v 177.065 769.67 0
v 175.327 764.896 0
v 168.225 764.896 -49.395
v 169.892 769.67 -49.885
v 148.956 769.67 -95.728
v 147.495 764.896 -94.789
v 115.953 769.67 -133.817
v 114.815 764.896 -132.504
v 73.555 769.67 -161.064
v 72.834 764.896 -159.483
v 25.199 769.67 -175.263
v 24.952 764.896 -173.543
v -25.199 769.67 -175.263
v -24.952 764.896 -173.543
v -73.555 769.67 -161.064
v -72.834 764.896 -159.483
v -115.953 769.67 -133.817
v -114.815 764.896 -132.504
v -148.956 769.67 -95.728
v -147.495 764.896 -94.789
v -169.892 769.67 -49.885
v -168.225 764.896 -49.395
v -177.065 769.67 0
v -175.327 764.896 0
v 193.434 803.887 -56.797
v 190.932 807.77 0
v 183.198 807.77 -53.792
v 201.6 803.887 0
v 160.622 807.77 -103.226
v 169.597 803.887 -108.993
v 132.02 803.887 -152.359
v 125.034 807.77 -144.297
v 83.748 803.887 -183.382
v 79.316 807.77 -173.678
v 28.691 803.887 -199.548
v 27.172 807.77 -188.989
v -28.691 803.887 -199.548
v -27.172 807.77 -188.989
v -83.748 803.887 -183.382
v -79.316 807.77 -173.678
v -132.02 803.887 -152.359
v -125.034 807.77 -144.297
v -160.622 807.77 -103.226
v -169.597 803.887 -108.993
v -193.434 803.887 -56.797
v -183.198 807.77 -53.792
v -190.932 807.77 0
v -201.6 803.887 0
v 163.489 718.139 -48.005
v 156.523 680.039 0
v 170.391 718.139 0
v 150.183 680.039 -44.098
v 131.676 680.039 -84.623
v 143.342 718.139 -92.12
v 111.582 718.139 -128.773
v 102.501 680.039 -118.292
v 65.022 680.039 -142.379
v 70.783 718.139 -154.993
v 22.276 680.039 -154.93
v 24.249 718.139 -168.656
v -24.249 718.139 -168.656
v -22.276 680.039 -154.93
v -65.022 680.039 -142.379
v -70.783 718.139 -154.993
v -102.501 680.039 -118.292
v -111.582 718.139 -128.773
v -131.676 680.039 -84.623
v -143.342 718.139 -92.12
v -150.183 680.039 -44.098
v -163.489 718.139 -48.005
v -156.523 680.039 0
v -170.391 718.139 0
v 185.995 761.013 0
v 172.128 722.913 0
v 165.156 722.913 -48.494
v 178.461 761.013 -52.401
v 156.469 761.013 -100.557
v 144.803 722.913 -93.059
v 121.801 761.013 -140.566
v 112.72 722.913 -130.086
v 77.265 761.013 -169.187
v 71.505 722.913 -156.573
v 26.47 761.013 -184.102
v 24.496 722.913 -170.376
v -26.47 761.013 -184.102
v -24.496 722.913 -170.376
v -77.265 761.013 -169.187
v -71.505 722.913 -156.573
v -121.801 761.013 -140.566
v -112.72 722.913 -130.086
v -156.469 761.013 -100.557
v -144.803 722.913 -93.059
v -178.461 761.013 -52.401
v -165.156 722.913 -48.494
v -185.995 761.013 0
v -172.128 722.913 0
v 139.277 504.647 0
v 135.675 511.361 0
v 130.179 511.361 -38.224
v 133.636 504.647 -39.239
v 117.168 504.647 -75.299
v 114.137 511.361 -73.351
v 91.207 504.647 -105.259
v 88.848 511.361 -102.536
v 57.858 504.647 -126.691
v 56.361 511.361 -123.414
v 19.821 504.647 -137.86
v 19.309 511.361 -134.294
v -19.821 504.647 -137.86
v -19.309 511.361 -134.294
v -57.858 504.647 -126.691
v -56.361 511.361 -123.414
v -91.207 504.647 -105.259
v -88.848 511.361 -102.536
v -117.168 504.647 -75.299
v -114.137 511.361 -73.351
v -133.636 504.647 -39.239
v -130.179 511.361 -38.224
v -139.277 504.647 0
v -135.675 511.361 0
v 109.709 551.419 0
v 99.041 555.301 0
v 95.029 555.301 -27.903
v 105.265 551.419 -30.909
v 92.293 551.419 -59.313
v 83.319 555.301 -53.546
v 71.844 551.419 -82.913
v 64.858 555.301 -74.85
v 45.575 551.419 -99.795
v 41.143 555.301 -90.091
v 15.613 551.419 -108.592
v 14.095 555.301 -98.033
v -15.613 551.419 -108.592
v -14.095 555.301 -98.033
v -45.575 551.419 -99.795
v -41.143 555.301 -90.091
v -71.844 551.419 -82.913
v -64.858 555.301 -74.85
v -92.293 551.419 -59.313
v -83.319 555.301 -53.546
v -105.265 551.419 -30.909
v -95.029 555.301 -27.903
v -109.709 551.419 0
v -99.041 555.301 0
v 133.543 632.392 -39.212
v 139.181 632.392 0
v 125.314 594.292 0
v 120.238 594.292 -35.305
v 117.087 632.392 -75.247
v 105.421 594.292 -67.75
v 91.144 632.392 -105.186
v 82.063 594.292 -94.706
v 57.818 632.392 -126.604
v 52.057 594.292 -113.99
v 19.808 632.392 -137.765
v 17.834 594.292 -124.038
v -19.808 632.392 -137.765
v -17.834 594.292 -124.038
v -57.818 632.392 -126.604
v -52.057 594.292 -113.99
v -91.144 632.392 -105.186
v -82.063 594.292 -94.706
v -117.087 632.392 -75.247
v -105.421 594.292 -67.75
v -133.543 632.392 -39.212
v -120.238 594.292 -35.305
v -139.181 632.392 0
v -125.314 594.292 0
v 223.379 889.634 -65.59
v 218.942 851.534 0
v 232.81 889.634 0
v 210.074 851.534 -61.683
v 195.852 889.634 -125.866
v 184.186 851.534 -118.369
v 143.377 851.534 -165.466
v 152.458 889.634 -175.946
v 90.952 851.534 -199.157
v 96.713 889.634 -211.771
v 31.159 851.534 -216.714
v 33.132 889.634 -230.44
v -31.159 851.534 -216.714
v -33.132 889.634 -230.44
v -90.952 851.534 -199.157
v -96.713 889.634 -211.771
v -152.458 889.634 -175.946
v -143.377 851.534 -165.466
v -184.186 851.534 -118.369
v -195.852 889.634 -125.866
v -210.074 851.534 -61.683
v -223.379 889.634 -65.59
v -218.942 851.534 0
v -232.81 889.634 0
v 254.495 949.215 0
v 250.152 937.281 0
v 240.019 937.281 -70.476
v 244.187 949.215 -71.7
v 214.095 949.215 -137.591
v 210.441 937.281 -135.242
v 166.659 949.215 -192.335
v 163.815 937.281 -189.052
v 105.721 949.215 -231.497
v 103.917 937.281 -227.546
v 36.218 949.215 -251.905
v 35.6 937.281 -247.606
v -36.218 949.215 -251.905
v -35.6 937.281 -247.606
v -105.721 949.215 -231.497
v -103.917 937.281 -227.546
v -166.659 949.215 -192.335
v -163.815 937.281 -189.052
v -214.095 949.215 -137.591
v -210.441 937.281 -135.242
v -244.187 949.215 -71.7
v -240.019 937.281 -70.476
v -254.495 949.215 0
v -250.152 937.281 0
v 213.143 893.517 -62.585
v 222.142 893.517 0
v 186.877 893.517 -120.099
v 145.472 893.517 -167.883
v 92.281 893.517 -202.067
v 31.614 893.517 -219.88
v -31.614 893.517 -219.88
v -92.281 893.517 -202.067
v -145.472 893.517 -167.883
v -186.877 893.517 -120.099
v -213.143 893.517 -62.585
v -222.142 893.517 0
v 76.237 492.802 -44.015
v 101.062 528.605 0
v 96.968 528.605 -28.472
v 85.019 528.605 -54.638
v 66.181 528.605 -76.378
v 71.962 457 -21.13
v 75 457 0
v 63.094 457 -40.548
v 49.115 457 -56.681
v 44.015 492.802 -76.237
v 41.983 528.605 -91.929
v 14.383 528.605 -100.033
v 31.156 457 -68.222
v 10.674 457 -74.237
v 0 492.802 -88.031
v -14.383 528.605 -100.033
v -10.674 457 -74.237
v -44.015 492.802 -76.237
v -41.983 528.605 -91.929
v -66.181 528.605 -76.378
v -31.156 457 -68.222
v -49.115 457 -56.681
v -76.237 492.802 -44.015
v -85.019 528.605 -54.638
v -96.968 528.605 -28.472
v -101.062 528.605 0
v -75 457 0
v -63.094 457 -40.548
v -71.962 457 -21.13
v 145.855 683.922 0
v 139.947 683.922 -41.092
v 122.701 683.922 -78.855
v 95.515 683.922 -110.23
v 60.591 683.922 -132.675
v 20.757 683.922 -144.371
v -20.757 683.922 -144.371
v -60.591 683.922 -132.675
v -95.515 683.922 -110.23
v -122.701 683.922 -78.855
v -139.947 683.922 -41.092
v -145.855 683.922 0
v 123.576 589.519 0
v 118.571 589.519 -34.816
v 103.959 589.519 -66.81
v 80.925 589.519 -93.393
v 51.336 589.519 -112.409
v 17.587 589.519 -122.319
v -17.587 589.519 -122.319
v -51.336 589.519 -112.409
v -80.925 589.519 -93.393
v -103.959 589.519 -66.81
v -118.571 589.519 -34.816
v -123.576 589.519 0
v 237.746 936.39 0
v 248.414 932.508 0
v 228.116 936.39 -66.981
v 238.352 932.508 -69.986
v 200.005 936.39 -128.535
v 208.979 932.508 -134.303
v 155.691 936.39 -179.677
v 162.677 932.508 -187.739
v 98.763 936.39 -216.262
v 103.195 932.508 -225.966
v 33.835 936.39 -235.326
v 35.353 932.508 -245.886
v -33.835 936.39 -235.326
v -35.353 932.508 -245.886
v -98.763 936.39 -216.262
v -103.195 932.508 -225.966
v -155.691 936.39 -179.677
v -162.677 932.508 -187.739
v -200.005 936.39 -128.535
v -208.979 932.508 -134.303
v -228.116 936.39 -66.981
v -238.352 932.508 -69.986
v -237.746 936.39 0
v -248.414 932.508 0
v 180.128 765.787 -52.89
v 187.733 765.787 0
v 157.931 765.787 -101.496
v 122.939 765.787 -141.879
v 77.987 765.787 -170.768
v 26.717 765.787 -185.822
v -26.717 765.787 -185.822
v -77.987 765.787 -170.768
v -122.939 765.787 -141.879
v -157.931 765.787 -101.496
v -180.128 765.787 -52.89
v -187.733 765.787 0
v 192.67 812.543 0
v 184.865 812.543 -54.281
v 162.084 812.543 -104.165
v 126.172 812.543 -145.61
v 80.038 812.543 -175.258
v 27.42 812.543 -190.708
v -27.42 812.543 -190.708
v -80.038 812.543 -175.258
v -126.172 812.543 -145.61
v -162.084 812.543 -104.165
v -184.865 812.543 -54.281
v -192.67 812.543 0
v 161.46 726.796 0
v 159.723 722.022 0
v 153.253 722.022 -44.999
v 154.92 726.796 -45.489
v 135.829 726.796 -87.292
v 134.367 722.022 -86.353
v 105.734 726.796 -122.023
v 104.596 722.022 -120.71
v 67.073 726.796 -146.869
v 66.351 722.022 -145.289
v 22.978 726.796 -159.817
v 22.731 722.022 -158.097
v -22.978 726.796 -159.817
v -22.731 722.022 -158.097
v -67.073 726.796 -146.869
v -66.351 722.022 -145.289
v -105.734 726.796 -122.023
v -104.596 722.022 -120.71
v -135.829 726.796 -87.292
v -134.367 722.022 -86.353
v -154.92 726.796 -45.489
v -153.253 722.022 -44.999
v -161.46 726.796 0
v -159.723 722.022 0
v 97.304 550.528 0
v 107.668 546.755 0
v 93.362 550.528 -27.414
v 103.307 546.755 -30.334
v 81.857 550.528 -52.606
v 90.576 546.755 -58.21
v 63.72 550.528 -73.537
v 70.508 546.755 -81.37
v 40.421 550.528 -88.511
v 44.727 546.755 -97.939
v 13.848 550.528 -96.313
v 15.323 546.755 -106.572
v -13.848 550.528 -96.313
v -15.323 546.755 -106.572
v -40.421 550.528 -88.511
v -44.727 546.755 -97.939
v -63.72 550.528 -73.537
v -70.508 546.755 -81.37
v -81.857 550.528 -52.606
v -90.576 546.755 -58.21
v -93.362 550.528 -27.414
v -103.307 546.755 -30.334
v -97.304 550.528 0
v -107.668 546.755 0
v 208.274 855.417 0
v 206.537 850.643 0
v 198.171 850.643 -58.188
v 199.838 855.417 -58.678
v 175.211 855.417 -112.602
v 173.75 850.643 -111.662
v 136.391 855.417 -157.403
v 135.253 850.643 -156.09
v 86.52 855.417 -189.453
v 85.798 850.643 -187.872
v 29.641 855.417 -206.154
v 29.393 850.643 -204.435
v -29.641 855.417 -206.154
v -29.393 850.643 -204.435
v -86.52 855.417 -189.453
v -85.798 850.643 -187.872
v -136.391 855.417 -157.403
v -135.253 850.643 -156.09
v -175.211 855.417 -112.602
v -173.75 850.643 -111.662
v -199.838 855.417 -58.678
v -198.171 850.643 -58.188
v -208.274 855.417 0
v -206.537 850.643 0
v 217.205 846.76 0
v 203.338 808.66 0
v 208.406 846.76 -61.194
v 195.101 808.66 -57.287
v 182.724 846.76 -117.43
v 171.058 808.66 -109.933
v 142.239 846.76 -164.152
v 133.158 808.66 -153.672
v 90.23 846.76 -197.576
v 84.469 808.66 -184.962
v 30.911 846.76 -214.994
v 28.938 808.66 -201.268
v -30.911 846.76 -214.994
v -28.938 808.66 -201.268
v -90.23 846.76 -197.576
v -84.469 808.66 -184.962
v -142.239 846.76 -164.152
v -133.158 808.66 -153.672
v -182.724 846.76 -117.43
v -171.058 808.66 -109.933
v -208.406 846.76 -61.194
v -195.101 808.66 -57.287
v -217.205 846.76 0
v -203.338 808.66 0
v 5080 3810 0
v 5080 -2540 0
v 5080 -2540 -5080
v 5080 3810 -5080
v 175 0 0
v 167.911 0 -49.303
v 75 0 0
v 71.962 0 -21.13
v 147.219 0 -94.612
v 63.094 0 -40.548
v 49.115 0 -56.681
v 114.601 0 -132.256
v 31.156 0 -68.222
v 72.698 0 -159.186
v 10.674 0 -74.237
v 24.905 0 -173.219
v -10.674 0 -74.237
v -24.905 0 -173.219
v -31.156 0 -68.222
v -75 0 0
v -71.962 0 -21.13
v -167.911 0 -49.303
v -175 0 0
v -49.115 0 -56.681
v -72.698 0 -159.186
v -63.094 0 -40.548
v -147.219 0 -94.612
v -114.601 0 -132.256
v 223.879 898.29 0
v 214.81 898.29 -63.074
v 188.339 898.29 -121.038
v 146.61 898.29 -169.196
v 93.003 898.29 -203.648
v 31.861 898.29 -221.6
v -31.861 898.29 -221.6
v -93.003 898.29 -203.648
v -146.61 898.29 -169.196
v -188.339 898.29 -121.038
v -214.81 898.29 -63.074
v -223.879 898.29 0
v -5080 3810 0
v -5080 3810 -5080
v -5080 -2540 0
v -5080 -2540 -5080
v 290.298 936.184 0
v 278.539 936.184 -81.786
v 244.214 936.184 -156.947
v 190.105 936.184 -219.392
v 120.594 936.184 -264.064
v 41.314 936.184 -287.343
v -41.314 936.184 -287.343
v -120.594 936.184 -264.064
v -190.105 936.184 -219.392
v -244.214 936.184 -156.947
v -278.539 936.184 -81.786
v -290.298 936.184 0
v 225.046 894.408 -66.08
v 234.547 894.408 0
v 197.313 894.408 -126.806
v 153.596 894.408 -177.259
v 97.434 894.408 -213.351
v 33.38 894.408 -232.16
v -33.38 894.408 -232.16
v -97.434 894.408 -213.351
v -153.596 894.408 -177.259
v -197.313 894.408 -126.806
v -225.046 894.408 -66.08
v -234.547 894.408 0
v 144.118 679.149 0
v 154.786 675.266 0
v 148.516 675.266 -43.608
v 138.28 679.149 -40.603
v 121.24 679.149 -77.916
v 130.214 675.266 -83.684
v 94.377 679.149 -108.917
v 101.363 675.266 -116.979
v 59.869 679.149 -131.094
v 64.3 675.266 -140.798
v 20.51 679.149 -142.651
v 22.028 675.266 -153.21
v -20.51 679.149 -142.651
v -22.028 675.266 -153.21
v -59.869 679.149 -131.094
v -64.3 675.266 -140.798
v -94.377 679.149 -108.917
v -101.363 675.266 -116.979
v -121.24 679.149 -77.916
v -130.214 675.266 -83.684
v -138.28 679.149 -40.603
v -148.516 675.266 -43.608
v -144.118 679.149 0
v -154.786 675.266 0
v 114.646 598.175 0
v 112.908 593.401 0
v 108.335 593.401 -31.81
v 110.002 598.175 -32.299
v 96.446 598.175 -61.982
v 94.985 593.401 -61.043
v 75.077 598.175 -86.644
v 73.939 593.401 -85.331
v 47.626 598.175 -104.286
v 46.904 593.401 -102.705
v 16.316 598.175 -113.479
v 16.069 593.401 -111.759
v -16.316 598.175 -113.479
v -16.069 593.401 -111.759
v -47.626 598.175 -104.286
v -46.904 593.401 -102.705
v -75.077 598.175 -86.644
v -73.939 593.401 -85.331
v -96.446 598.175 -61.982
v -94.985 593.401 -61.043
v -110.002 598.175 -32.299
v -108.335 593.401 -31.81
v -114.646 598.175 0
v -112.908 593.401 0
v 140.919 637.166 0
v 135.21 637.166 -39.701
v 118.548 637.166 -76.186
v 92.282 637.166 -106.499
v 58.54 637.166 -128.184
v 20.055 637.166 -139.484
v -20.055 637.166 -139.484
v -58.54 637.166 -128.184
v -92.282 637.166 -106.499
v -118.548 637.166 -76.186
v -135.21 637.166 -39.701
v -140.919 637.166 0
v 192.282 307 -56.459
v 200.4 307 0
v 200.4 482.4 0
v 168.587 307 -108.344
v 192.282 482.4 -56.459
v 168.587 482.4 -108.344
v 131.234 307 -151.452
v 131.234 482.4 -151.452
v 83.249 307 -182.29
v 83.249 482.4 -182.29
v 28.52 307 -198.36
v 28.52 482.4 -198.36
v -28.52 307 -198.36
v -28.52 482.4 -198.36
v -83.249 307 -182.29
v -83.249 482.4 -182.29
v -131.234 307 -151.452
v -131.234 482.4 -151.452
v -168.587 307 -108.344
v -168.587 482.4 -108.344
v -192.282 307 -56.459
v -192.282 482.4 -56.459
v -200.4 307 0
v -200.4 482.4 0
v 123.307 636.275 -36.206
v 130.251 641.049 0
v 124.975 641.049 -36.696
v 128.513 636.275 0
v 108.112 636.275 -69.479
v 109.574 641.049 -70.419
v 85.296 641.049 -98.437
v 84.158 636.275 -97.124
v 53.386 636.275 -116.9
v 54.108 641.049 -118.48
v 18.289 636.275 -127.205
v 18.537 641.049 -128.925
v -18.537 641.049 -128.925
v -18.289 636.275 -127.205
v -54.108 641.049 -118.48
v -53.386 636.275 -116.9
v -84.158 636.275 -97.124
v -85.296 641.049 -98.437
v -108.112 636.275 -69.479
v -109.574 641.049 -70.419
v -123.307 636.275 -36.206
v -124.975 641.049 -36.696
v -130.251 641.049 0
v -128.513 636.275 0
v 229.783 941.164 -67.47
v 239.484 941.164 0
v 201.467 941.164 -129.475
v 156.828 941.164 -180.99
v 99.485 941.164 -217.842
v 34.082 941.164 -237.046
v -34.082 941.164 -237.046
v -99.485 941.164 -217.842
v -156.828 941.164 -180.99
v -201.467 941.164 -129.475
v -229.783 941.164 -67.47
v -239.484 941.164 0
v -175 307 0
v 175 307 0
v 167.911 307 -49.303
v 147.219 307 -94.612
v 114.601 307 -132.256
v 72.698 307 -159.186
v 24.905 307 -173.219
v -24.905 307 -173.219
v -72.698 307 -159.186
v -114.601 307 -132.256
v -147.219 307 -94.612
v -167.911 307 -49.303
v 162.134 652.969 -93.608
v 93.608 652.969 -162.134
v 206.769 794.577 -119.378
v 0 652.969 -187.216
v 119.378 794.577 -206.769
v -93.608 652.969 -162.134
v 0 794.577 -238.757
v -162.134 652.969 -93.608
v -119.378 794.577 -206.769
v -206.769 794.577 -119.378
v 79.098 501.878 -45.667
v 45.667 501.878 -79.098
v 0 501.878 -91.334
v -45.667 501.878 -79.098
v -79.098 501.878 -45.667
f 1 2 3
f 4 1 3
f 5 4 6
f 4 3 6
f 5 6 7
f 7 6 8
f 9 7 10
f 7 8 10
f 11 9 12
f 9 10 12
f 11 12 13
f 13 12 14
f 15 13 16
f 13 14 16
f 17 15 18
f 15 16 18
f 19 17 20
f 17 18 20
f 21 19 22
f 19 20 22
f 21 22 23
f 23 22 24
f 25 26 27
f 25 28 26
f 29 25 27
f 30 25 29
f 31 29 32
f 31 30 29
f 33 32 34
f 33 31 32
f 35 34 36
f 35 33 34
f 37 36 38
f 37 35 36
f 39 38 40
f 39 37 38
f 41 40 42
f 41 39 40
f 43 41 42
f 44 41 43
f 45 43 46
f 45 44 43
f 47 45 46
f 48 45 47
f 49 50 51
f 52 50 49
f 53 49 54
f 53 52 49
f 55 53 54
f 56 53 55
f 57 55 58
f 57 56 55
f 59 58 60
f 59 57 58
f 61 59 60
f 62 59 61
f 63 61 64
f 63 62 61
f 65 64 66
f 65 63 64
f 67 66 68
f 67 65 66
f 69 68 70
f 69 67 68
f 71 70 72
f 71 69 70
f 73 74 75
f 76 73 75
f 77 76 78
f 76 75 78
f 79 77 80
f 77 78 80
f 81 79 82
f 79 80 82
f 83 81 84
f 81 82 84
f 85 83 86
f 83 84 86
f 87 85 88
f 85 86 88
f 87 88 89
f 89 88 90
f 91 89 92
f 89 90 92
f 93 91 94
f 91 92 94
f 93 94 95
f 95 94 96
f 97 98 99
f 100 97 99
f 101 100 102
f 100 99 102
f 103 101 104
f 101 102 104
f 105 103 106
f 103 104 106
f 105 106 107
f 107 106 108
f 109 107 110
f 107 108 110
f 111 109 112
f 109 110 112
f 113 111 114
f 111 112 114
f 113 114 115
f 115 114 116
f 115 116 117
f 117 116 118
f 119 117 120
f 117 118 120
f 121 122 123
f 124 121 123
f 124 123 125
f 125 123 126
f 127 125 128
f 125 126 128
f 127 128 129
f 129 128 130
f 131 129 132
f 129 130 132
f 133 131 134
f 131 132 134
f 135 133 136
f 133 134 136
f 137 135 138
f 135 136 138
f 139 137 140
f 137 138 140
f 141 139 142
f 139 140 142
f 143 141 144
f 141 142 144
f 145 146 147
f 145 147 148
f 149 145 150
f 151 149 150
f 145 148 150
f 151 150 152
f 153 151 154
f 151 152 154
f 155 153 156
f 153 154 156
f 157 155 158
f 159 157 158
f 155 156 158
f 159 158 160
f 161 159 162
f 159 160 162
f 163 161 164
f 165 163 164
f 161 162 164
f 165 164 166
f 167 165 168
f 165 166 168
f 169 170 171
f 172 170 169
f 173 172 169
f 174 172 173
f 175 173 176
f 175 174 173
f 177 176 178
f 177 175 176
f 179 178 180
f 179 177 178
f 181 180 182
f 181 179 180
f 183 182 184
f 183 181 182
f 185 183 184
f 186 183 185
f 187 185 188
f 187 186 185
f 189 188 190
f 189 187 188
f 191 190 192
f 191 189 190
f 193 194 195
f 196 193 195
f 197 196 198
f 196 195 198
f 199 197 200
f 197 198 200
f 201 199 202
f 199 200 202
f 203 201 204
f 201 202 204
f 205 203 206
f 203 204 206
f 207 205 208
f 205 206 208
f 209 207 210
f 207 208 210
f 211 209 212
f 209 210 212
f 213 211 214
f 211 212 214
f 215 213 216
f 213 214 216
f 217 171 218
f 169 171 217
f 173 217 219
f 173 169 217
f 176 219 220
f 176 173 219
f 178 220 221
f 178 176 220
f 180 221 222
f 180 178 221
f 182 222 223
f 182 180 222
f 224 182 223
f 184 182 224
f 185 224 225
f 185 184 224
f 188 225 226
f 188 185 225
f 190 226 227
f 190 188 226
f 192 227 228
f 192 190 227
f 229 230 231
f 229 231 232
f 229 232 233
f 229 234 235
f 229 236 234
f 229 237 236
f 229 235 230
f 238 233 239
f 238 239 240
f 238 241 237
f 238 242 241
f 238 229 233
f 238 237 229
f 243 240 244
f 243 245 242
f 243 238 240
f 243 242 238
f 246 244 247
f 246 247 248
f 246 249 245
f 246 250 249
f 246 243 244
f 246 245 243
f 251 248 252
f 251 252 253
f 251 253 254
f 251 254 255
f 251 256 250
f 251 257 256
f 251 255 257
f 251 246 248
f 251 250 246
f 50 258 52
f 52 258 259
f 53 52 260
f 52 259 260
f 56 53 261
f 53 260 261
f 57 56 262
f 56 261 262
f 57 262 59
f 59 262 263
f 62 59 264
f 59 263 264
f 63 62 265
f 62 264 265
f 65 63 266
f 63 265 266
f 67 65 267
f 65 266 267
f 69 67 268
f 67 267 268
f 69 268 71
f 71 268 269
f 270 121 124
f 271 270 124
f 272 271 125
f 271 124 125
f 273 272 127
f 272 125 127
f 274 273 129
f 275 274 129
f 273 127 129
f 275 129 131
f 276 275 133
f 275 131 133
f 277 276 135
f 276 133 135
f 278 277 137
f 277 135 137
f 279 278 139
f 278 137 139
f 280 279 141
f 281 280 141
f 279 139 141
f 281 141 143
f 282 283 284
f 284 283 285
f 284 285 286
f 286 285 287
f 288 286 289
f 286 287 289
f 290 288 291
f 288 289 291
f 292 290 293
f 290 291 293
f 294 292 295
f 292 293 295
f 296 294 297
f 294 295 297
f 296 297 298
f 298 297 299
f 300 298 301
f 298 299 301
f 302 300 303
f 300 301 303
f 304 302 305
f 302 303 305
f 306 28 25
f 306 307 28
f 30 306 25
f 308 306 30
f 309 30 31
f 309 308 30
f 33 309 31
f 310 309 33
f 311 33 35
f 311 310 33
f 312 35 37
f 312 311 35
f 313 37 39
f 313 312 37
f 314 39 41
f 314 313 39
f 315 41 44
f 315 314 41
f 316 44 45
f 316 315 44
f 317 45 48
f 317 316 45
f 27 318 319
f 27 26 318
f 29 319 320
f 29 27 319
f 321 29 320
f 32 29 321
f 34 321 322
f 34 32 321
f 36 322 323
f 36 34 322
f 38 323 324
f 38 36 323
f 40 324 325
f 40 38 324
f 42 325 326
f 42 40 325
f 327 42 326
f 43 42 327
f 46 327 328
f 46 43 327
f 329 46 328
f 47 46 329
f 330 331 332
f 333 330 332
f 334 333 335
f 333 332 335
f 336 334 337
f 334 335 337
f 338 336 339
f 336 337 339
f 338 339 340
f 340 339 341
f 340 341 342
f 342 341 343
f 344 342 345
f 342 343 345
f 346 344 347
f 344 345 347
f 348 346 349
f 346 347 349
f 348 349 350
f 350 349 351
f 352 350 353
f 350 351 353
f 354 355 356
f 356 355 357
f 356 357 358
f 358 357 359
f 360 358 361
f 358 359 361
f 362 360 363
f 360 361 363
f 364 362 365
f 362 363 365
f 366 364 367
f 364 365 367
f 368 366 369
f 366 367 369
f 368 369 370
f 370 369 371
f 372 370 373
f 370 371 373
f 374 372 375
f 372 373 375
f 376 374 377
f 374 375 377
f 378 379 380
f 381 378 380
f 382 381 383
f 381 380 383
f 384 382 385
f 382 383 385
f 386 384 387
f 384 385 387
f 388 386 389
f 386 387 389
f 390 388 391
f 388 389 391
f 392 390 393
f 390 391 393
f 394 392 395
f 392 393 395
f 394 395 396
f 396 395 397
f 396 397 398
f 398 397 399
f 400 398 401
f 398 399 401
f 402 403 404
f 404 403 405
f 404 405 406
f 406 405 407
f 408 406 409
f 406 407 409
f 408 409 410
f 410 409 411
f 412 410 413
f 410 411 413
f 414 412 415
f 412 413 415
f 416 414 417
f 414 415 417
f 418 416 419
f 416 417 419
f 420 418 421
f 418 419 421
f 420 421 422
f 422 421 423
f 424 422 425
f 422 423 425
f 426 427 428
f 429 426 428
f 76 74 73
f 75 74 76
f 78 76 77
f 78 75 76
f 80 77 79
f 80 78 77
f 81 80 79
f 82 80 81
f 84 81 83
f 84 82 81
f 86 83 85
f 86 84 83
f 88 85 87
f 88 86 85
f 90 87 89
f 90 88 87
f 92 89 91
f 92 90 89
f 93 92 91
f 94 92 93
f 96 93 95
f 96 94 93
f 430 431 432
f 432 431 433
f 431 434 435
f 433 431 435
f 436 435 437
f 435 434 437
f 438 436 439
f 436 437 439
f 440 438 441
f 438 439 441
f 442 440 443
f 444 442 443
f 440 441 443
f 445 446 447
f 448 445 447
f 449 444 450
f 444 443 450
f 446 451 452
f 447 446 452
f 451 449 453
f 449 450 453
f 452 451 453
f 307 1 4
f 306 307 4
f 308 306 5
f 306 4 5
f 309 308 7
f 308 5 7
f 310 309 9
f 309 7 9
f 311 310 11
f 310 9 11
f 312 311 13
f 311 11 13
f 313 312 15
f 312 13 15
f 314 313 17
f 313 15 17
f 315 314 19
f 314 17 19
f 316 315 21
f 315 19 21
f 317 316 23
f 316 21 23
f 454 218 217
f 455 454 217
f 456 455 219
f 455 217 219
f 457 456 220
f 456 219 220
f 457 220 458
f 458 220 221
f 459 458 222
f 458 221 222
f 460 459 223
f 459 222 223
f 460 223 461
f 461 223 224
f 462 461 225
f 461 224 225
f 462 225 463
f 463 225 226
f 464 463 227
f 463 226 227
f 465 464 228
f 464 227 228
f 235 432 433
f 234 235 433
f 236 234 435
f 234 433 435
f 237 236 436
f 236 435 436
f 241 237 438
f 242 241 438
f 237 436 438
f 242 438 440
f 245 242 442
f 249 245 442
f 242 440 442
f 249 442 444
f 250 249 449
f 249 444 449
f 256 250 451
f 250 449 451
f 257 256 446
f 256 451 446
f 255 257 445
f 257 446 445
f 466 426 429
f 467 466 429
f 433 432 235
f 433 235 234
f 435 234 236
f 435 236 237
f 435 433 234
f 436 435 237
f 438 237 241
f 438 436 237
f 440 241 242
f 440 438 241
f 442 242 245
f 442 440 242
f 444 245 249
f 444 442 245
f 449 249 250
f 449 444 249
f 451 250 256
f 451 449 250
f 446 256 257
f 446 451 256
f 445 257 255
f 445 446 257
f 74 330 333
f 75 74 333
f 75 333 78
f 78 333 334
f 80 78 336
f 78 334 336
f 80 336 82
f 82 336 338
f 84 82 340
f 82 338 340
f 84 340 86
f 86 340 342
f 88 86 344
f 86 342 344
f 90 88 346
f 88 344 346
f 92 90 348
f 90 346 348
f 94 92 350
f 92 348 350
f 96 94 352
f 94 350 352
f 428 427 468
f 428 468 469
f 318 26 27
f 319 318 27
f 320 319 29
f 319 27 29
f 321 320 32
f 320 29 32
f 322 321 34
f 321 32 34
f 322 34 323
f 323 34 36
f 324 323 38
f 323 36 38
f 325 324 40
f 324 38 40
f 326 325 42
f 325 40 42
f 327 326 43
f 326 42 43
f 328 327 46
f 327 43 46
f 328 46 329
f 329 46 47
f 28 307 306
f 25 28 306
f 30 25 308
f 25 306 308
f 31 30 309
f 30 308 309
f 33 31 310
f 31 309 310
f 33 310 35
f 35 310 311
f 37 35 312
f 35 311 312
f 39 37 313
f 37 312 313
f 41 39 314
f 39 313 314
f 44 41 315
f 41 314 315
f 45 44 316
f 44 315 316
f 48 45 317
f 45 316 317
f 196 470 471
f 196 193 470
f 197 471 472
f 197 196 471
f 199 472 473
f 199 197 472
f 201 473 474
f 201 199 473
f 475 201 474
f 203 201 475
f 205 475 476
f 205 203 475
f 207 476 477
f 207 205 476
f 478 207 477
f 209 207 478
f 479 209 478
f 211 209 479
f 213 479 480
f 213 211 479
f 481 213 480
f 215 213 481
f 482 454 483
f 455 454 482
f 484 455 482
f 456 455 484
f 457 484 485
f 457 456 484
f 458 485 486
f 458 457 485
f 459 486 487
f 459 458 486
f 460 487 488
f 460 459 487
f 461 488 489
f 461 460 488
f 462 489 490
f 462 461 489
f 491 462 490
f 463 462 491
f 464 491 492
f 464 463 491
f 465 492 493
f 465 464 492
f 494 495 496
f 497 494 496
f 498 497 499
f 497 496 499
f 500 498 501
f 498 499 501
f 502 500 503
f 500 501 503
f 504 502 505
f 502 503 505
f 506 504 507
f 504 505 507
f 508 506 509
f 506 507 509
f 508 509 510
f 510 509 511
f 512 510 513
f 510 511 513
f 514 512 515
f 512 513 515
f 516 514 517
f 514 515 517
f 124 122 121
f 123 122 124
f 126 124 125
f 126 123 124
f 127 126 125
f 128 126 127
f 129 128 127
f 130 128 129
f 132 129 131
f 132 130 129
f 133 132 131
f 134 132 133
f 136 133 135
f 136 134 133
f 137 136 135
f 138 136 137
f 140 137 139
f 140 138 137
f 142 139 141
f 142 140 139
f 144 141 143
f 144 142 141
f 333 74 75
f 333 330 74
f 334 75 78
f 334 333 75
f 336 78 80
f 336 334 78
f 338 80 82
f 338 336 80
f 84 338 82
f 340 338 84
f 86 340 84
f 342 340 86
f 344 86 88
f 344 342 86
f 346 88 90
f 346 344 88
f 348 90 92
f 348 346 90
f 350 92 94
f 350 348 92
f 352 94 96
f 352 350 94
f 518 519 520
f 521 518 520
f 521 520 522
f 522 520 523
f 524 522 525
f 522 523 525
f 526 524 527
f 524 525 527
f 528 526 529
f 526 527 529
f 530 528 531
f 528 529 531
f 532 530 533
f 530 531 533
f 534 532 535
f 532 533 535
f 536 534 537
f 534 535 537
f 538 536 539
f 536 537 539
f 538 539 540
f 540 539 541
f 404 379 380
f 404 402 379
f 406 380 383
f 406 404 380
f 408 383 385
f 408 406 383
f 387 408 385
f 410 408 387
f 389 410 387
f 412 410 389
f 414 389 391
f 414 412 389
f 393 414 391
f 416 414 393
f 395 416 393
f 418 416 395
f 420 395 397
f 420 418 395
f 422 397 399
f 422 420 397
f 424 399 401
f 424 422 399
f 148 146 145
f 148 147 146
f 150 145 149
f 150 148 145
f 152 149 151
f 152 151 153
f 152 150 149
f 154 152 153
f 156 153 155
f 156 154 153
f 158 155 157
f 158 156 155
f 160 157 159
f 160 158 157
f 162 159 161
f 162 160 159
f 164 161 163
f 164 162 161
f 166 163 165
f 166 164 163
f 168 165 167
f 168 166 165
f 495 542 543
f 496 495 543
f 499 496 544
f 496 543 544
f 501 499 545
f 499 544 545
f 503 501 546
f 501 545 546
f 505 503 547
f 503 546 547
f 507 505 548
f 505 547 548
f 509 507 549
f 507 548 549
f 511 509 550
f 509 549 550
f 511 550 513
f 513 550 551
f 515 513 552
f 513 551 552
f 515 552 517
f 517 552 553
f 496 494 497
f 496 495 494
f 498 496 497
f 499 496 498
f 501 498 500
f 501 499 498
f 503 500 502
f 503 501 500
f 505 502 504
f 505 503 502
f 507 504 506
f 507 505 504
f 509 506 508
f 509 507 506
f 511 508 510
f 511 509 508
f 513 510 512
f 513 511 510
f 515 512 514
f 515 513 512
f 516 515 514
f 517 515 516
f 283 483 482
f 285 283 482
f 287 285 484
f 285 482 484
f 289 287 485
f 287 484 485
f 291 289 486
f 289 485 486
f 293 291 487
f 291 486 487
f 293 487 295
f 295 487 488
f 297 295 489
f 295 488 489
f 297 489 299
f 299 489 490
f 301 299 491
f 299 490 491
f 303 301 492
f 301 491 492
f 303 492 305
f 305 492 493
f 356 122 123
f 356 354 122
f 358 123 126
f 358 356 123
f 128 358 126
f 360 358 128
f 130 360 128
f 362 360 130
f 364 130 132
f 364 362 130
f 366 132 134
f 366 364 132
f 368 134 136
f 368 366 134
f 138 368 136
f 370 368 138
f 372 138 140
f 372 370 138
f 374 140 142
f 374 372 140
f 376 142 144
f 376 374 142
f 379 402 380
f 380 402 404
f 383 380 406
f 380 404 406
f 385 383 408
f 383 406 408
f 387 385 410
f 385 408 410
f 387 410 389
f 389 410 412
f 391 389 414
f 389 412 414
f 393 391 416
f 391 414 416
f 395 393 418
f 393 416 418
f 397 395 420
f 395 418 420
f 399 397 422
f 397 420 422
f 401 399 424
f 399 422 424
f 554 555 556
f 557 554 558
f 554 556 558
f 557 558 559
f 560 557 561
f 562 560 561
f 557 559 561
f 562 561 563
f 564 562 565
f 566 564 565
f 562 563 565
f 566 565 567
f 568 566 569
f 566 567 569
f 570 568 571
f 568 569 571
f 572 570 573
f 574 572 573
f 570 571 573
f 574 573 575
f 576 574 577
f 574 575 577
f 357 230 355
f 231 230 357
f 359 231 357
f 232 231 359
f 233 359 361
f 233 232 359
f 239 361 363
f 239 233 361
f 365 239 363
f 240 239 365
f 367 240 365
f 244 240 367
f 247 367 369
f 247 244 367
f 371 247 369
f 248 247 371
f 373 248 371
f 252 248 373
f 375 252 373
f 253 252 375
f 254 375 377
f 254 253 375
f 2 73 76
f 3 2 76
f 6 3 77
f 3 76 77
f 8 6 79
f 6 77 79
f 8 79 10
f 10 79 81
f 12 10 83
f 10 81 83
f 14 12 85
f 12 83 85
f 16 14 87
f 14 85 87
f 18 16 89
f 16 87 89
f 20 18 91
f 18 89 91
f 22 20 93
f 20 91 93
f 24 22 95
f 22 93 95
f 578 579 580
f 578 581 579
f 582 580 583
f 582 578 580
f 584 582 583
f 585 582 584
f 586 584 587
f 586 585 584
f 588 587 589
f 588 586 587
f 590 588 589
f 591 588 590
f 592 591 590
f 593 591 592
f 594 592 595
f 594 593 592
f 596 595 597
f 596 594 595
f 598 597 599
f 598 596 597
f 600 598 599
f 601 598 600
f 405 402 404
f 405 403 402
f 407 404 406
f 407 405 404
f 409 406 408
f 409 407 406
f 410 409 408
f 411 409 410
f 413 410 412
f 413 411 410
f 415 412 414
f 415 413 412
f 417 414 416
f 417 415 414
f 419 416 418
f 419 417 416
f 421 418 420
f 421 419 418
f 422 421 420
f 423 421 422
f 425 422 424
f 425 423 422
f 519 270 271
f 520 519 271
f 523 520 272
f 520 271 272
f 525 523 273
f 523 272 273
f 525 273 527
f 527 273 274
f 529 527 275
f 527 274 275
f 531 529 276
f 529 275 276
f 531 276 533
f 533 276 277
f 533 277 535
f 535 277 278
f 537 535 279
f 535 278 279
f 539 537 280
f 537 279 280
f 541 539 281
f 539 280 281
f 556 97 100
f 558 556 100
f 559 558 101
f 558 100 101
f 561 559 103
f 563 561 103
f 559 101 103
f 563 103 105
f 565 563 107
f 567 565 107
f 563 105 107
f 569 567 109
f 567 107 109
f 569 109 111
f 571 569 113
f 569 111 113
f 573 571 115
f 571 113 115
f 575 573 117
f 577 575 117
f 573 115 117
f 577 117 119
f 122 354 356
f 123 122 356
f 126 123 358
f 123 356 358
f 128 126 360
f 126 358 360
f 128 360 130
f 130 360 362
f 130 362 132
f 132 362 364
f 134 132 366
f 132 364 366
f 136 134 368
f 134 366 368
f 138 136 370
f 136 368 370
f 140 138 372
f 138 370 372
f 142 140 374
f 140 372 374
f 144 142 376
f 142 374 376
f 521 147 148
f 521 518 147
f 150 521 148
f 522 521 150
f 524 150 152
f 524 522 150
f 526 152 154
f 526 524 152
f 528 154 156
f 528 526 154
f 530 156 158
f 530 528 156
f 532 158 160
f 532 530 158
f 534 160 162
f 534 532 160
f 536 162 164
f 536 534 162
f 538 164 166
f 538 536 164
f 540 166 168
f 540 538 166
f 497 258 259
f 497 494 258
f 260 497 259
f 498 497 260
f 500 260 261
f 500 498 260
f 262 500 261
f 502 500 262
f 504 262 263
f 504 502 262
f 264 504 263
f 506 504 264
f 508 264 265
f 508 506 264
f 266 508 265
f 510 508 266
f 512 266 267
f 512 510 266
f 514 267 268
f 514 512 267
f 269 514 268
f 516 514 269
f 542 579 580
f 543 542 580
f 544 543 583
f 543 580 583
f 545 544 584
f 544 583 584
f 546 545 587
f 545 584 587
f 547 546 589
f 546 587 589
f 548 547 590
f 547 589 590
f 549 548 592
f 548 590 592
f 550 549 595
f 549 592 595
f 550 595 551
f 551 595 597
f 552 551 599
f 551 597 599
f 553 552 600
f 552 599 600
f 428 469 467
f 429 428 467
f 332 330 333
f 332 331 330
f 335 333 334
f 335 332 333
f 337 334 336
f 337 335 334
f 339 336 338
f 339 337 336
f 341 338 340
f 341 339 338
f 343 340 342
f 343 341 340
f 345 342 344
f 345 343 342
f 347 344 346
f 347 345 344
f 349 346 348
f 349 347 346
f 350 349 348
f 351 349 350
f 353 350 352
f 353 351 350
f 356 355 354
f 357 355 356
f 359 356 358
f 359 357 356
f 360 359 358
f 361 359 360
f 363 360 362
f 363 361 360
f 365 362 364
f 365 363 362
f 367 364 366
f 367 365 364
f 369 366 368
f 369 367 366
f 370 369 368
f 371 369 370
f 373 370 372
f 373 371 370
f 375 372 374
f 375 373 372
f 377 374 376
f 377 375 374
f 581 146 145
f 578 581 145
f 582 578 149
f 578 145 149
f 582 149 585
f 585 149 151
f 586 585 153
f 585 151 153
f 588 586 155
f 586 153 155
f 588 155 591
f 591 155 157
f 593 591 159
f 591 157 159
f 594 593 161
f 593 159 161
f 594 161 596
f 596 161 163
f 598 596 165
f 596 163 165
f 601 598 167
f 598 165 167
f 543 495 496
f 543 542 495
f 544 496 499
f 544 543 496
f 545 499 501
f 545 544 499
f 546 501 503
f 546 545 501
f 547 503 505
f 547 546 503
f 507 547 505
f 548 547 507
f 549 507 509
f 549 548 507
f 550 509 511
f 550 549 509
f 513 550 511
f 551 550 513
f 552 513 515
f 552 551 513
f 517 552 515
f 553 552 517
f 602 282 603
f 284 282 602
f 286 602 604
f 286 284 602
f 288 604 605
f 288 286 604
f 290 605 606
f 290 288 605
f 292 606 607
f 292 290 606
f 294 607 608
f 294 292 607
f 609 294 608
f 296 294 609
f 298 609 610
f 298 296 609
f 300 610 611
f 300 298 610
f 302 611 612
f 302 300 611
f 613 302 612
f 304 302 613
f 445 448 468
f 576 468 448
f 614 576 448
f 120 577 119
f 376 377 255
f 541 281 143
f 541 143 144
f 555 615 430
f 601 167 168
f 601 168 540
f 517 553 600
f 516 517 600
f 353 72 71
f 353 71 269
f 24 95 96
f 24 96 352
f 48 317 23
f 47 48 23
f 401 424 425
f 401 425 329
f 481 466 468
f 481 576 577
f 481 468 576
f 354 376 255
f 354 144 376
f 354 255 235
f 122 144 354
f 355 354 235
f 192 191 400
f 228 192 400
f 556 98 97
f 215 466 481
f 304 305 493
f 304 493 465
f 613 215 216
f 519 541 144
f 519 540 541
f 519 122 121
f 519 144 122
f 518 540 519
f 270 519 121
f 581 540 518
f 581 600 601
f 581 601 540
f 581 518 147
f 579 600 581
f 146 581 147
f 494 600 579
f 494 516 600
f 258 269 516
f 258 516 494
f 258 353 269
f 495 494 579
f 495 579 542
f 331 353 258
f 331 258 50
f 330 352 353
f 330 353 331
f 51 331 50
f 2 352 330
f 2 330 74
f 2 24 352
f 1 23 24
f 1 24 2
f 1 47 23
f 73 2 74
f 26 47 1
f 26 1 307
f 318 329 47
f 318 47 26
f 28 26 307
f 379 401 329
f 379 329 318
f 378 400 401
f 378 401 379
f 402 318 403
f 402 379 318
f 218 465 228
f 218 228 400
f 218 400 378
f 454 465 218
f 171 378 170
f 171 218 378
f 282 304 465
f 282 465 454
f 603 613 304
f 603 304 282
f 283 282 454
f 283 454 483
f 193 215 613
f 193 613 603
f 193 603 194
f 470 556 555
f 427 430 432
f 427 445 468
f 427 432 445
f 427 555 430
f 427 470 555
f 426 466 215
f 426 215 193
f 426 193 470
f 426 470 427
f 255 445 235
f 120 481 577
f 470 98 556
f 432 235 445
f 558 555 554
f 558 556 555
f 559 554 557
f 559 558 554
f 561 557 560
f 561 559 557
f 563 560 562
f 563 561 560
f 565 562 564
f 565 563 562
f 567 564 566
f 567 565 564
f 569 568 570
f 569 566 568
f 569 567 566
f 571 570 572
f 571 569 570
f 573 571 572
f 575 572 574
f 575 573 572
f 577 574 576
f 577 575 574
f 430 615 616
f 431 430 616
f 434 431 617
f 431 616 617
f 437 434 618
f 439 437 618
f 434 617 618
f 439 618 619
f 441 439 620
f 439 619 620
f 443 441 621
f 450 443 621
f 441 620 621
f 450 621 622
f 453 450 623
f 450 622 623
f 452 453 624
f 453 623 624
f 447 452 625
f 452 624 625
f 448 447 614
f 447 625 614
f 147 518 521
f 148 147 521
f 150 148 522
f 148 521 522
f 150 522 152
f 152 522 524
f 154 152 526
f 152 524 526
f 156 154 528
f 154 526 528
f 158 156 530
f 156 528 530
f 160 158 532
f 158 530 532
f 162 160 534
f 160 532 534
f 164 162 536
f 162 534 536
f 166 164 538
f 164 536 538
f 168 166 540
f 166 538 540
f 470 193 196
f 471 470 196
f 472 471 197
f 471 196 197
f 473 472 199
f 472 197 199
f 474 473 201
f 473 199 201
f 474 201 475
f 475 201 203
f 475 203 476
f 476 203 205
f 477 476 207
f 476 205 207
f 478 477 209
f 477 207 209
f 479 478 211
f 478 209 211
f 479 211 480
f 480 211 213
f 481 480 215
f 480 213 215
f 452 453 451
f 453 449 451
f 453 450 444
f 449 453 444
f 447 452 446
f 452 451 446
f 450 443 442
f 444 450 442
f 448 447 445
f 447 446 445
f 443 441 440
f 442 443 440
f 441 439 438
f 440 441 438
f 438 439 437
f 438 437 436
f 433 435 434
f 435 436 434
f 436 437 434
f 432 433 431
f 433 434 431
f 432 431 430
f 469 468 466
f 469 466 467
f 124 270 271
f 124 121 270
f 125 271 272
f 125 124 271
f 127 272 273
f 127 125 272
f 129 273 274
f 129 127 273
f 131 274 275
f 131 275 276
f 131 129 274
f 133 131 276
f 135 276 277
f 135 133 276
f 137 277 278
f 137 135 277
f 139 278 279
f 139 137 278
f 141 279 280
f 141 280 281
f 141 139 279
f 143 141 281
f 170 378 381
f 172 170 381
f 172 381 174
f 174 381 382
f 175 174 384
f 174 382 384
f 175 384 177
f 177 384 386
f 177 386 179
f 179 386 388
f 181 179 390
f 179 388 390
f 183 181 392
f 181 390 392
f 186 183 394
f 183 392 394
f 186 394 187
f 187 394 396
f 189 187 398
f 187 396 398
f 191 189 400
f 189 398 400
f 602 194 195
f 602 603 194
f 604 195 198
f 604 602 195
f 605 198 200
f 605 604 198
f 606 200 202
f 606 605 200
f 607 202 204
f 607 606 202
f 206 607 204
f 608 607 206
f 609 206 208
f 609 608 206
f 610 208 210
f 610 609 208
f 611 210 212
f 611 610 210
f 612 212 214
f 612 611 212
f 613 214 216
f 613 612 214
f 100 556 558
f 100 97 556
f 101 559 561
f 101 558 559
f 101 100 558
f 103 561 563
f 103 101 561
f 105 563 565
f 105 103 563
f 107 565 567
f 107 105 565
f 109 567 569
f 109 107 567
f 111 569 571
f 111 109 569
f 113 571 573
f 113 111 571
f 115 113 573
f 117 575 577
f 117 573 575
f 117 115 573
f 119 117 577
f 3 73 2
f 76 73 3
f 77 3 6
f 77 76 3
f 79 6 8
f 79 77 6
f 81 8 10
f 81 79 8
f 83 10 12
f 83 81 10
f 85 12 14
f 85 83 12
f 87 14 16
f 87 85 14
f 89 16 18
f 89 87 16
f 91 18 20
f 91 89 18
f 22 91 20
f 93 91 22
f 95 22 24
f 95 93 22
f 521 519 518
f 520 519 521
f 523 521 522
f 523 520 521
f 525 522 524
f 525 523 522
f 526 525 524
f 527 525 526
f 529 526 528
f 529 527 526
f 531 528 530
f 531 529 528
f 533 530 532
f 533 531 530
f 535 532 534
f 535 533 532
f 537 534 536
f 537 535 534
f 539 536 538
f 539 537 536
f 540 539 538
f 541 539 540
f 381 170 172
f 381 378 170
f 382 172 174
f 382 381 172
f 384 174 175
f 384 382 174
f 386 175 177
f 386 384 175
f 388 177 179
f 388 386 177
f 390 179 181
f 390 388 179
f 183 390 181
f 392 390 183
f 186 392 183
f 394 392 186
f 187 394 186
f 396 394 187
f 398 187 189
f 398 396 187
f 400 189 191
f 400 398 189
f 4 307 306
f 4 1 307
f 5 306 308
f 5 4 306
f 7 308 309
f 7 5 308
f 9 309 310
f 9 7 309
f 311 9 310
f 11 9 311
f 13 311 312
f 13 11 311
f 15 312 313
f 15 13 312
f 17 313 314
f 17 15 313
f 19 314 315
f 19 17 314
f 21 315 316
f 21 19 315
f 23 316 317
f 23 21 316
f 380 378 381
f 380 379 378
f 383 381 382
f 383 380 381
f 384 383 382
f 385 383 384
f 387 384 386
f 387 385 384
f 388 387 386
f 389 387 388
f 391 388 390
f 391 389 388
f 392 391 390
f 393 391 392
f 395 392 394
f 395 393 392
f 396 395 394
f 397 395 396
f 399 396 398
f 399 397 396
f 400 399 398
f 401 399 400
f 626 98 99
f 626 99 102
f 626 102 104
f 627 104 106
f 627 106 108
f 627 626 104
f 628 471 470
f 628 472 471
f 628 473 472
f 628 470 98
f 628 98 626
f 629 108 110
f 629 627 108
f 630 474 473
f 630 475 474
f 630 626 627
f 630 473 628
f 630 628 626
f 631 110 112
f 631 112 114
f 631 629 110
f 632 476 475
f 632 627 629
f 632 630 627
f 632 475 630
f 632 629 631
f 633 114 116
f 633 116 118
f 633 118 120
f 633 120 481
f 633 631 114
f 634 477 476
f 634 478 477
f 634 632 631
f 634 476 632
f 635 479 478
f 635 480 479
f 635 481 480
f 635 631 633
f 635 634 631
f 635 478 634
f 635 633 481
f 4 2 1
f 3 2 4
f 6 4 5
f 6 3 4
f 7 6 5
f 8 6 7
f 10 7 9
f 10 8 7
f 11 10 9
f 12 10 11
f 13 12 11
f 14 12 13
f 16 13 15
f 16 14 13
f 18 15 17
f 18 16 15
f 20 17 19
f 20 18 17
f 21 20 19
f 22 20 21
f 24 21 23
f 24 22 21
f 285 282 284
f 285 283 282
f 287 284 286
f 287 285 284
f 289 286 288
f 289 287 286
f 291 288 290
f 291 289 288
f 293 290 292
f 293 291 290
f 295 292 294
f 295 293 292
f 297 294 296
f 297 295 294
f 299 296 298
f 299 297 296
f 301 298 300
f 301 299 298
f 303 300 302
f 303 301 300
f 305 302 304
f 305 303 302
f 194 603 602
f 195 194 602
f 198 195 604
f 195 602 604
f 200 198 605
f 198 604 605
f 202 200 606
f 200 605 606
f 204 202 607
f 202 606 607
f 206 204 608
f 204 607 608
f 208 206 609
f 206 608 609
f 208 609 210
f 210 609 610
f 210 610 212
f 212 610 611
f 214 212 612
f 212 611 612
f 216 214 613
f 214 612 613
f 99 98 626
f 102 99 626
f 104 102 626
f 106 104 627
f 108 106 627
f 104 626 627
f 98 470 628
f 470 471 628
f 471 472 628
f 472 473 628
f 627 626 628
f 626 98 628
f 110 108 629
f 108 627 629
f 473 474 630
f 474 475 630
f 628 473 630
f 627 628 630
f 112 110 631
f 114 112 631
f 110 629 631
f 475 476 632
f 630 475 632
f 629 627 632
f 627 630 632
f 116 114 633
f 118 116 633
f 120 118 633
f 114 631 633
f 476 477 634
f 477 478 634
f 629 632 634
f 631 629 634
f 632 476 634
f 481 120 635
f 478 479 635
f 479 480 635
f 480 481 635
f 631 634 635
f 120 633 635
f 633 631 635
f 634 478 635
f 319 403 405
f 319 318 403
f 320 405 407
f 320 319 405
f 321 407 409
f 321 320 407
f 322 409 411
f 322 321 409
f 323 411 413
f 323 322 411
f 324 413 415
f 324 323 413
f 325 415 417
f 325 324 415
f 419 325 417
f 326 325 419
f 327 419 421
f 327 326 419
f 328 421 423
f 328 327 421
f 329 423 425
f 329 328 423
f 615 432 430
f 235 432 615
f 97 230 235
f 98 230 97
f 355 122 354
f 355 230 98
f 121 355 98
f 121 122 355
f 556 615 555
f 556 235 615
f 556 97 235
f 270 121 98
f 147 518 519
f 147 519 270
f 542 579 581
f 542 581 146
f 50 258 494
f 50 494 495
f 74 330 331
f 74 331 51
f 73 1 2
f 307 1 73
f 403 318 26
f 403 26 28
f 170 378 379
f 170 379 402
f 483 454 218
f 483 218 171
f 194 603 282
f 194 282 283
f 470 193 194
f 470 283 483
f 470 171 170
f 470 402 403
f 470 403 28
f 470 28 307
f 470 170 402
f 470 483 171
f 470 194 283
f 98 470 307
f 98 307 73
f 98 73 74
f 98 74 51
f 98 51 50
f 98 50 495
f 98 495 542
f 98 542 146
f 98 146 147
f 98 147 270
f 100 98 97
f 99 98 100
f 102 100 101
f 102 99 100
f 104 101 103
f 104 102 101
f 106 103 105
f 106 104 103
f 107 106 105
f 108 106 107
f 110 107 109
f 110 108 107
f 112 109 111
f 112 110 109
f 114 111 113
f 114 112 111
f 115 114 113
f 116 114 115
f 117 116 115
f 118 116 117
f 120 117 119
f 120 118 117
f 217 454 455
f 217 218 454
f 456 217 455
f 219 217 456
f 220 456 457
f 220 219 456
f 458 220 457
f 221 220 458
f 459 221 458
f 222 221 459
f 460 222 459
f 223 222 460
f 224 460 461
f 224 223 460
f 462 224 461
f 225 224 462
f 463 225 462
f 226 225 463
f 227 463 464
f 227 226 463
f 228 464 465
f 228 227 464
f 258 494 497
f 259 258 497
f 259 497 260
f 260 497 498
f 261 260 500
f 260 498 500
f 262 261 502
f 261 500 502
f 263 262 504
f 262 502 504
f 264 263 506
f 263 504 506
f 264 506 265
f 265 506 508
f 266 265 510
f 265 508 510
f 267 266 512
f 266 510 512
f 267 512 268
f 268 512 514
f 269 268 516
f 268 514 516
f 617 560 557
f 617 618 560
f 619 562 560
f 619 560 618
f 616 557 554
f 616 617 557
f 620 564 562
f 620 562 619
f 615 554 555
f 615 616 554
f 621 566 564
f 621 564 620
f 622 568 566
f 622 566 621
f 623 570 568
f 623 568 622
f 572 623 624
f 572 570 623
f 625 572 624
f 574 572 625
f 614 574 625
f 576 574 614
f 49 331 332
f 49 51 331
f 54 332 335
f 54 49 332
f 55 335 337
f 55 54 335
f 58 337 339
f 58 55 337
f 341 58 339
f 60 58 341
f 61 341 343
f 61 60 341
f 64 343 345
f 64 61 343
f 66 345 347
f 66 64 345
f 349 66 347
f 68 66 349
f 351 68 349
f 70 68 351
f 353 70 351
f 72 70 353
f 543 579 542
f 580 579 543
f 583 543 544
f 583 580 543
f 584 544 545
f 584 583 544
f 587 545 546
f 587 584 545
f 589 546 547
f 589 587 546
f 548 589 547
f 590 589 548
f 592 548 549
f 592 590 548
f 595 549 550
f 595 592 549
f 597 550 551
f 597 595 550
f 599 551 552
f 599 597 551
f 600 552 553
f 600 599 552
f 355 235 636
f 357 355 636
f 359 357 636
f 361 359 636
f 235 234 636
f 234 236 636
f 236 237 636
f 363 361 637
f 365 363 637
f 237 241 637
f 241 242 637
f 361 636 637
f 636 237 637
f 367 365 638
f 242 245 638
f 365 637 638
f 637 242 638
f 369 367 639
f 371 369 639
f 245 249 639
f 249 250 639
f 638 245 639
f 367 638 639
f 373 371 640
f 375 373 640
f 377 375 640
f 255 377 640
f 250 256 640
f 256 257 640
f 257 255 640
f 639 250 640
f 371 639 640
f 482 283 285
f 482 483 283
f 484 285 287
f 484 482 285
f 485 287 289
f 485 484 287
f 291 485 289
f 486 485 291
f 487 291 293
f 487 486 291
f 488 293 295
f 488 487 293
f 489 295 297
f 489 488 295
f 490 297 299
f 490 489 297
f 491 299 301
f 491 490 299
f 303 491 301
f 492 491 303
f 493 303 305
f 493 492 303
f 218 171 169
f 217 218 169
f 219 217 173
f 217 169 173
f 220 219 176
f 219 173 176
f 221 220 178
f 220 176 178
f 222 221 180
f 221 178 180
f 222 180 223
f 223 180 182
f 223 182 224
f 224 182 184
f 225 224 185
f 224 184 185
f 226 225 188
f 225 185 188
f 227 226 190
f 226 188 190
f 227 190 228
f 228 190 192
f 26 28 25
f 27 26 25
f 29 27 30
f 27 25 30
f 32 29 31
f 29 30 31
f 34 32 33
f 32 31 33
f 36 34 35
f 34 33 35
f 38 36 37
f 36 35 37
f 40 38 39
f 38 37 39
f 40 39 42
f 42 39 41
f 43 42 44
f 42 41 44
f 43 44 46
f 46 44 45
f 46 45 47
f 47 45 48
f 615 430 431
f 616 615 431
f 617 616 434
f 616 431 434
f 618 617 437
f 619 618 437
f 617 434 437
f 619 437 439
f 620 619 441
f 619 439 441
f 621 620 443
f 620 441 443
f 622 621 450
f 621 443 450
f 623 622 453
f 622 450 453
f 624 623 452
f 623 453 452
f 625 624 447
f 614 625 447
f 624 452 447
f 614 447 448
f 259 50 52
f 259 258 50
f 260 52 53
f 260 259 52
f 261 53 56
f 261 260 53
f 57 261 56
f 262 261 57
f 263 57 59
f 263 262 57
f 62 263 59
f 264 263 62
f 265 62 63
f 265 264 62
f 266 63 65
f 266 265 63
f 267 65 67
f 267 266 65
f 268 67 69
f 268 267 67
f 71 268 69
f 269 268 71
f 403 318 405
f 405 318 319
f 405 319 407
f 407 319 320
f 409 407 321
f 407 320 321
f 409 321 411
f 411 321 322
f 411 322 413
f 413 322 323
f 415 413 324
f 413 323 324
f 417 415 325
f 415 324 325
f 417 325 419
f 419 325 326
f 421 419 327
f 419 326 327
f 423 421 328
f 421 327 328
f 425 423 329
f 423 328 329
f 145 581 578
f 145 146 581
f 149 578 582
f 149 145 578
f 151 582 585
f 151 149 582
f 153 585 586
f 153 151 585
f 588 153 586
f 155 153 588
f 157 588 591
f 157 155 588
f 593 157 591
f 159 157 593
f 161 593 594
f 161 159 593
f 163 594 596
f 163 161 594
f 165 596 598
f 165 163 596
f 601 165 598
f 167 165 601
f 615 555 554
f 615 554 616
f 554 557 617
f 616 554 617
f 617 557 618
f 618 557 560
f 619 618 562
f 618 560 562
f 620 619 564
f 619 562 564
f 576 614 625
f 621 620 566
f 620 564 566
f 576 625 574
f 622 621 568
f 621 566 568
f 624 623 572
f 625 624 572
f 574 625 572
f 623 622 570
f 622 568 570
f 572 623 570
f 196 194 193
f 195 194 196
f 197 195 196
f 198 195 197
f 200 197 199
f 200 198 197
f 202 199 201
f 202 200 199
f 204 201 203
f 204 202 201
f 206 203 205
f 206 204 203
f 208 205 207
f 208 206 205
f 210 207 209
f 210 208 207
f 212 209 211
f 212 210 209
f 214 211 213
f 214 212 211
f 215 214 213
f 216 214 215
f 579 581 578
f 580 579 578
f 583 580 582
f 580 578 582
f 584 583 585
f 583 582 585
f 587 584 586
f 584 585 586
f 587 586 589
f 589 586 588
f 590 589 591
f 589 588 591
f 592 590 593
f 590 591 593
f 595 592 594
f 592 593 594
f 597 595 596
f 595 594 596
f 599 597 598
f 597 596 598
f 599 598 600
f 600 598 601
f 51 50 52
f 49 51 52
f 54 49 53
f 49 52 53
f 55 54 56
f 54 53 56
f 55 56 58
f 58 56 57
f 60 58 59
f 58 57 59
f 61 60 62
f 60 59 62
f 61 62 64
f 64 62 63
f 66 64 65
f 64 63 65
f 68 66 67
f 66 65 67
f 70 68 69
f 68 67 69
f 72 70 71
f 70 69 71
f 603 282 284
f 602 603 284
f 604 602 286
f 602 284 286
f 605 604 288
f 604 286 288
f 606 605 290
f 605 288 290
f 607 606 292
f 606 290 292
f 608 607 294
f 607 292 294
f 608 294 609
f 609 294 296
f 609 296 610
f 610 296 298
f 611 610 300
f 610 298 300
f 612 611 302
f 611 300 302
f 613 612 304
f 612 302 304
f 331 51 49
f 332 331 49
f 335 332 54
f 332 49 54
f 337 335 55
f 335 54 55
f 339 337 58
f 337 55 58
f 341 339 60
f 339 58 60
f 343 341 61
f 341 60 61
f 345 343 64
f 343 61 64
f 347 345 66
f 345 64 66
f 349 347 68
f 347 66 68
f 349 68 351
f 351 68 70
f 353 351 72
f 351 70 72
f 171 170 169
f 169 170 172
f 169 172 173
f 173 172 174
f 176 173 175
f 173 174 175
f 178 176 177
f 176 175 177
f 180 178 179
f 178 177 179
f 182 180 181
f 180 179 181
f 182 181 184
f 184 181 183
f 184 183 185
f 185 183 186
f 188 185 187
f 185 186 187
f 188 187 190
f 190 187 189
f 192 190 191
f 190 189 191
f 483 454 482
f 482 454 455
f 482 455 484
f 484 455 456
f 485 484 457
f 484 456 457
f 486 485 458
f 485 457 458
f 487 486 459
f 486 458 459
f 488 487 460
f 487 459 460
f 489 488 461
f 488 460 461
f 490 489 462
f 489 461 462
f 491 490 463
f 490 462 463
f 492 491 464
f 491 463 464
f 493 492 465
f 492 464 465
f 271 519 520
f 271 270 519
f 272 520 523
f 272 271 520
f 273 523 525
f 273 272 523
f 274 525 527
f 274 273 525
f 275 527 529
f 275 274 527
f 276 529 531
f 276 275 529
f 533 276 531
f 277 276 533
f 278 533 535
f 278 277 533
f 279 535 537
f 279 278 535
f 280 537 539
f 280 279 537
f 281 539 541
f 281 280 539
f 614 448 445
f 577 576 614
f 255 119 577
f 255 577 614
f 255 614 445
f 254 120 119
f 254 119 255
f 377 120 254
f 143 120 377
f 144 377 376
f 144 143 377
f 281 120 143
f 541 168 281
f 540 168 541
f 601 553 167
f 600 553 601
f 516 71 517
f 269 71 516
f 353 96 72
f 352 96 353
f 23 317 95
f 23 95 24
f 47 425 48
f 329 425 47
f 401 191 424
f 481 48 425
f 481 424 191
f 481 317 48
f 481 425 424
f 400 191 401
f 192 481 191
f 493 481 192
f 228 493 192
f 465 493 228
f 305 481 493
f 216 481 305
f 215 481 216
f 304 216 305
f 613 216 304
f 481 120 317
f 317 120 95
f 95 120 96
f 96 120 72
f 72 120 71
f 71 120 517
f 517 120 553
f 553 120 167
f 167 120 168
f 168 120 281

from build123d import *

# Parameters (mm, degrees)
SKETCH1_R           = 175
SKETCH1_R_2         = 75
BOSS_EXTRUDE1_DEPTH = 457
SKETCH3_W           = 10160
SKETCH3_H           = 6350
BOSS_EXTRUDE2_DEPTH = 5080
SKETCH4_W           = 13475.768327993
SKETCH4_H           = 8367.586519284
CUT_EXTRUDE1_DEPTH  = 8132.96778154


# Read off the part's stored shape, not the designer's step: Intersect1
with BuildPart() as part:
    # Sketch1 → Boss-Extrude1 (new body)
    with BuildSketch(Plane(origin=(0, 0, 0), x_dir=(1, 0, 0), z_dir=(0, 1, 0))):
        with Locations(Location((0, 0, 0), (0, 0, 270))):
            Circle(SKETCH1_R)
        with Locations(Location((0, 0, 0), (0, 0, 270))):
            Circle(SKETCH1_R_2, mode=Mode.SUBTRACT)
    extrude(amount=BOSS_EXTRUDE1_DEPTH)

    # Sketch2 → Revolve1 (revolve)
    with BuildSketch(Plane.XY, mode=Mode.PRIVATE) as revolve1_sk:
        Polygon((-175, 307), (-200.4, 307), (-200.4, 482.4), (-139.277313963, 504.646838356), (-135.674750747, 511.361444694), (-290.297671627, 936.184428342), (-254.495382775, 949.215395803), (-250.151726955, 937.281299519), (-239.483726955, 941.164133978), (-237.746264627, 936.390495464), (-248.414264627, 932.507661005), (-234.546998701, 894.407661005), (-223.878998701, 898.290495464), (-222.141536373, 893.516856951), (-232.809536373, 889.634022491), (-218.942270448, 851.534022491), (-208.274270448, 855.416856951), (-206.53680812, 850.643218437), (-217.20480812, 846.760383978), (-203.337542194, 808.660383978), (-192.669542194, 812.543218437), (-190.932079866, 807.769579923), (-201.600079866, 803.886745464), (-187.732813941, 765.786745464), (-177.064813941, 769.669579923), (-175.327351612, 764.89594141), (-185.995351612, 761.013106951), (-172.128085687, 722.913106951), (-161.460085687, 726.79594141), (-159.722623359, 722.022302896), (-170.390623359, 718.139468437), (-156.523357433, 680.039468437), (-145.855357433, 683.922302896), (-144.117895105, 679.148664383), (-154.785895105, 675.265829923), (-140.91862918, 637.165829923), (-130.25062918, 641.048664383), (-128.513166852, 636.275025869), (-139.181166852, 632.39219141), (-125.313900926, 594.29219141), (-114.645900926, 598.175025869), (-112.908438598, 593.401387355), (-123.576438598, 589.518552896), (-109.709172672, 551.418552896), (-99.041172672, 555.301387355), (-97.303710344, 550.527748842), (-107.668277546, 546.755354889), (-101.061934921, 528.604577704), (-75, 457), (-175, 457), align=None)
    revolve(revolve1_sk.sketch.rotate(Axis((0, 0, 0), (0, 1, 0)), 270), axis=Axis((0, 0, 0), (0, 1, 0)))


with BuildPart() as body_2:
    # Sketch3 → Boss-Extrude2 (new, symmetric)
    with BuildSketch(Plane(origin=(0, 0, 0), x_dir=(0, 0, -1), z_dir=(1, 0, 0))):
        with Locations((0, 635)):
            Rectangle(SKETCH3_W, SKETCH3_H)
    extrude(amount=BOSS_EXTRUDE2_DEPTH, both=True)

    # Intersect1 outline → Intersect1 (revolve, cut)
    with BuildSketch(Plane.XY):
        Polygon((107.668277546, 546.755354889), (75, 457), (75, 0), (175, 0), (175, 307), (200.4, 307), (200.4, 482.4), (139.277313963, 504.646838356), (135.674750747, 511.361444694), (290.297671627, 936.184428342), (254.495382775, 949.215395803), (250.151726955, 937.281299519), (239.483726955, 941.164133978), (237.746264627, 936.390495464), (248.414264627, 932.507661005), (234.546998701, 894.407661005), (223.878998701, 898.290495464), (222.141536373, 893.516856951), (232.809536373, 889.634022491), (218.942270448, 851.534022491), (208.274270448, 855.416856951), (206.53680812, 850.643218437), (217.20480812, 846.760383978), (203.337542194, 808.660383978), (192.669542194, 812.543218437), (190.932079866, 807.769579923), (201.600079866, 803.886745464), (187.732813941, 765.786745464), (177.064813941, 769.669579923), (175.327351612, 764.89594141), (185.995351612, 761.013106951), (172.128085687, 722.913106951), (161.460085687, 726.79594141), (159.722623359, 722.022302896), (170.390623359, 718.139468437), (156.523357433, 680.039468437), (145.855357433, 683.922302896), (144.117895105, 679.148664383), (154.785895105, 675.265829923), (140.91862918, 637.165829923), (130.25062918, 641.048664383), (128.513166852, 636.275025869), (139.181166852, 632.39219141), (125.313900926, 594.29219141), (114.645900926, 598.175025869), (112.908438598, 593.401387355), (123.576438598, 589.518552896), (109.709172672, 551.418552896), (99.041172672, 555.301387355), (97.303710344, 550.527748842), align=None)
    revolve(axis=Axis((0, 0, 0), (0, 1, 0)), mode=Mode.SUBTRACT)


with BuildPart() as cut_extrude1_tool:
    # Sketch4 → Cut-Extrude1 (new, through all)
    with BuildSketch(Plane.XY):
        with Locations((454.179344916, 464.014834855)):
            Rectangle(SKETCH4_W, SKETCH4_H)
    extrude(amount=CUT_EXTRUDE1_DEPTH)


with BuildPart() as part_1:
    add(part.part)

    # Cut-Extrude1: cut by cut_extrude1_tool
    add(cut_extrude1_tool.part, mode=Mode.SUBTRACT)


with BuildPart() as body_2_1:
    add(body_2.part)

    # Cut-Extrude1: cut by cut_extrude1_tool
    add(cut_extrude1_tool.part, mode=Mode.SUBTRACT)


solid = Compound([part_1.part, body_2_1.part])
